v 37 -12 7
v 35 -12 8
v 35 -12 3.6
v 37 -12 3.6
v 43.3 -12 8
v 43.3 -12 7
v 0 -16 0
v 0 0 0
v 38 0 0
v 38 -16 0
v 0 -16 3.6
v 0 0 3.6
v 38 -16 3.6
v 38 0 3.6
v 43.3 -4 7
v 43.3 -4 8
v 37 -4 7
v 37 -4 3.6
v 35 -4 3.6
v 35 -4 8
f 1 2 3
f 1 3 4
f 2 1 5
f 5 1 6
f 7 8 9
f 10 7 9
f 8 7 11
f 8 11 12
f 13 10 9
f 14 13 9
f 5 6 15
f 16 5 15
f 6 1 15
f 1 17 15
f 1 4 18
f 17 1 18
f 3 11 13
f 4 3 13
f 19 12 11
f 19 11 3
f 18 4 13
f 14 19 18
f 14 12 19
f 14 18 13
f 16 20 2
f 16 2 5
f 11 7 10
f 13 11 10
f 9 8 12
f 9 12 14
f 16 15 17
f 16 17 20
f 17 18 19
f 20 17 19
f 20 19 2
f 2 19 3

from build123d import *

# Parameters (mm, degrees)
F0_W     = 38
F0_H     = 16
F1_DEPTH = 3.6
F4_DEPTH = 3.4
F7_DEPTH = 1


with BuildPart() as f1:
    # F0 (on Top) → F1 (new body)
    with BuildSketch(Plane.XY):
        with Locations((19, -8)):
            Rectangle(F0_W, F0_H)
    extrude(amount=F1_DEPTH)

    # F3 (on offset) → F4 (join)
    with BuildSketch(Plane.XY.offset(3.6)):
        Polygon((37, -4), (35, -4), (35, -12), (37, -12), (37, -8), align=None)
    extrude(amount=F4_DEPTH)

    # F6 (on offset) → F7 (join)
    with BuildSketch(Plane.XY.offset(7)):
        Polygon((43.3, -12), (43.3, -8), (43.3, -4), (35, -4), (35, -12), align=None)
    extrude(amount=F7_DEPTH)


solid = f1.part
